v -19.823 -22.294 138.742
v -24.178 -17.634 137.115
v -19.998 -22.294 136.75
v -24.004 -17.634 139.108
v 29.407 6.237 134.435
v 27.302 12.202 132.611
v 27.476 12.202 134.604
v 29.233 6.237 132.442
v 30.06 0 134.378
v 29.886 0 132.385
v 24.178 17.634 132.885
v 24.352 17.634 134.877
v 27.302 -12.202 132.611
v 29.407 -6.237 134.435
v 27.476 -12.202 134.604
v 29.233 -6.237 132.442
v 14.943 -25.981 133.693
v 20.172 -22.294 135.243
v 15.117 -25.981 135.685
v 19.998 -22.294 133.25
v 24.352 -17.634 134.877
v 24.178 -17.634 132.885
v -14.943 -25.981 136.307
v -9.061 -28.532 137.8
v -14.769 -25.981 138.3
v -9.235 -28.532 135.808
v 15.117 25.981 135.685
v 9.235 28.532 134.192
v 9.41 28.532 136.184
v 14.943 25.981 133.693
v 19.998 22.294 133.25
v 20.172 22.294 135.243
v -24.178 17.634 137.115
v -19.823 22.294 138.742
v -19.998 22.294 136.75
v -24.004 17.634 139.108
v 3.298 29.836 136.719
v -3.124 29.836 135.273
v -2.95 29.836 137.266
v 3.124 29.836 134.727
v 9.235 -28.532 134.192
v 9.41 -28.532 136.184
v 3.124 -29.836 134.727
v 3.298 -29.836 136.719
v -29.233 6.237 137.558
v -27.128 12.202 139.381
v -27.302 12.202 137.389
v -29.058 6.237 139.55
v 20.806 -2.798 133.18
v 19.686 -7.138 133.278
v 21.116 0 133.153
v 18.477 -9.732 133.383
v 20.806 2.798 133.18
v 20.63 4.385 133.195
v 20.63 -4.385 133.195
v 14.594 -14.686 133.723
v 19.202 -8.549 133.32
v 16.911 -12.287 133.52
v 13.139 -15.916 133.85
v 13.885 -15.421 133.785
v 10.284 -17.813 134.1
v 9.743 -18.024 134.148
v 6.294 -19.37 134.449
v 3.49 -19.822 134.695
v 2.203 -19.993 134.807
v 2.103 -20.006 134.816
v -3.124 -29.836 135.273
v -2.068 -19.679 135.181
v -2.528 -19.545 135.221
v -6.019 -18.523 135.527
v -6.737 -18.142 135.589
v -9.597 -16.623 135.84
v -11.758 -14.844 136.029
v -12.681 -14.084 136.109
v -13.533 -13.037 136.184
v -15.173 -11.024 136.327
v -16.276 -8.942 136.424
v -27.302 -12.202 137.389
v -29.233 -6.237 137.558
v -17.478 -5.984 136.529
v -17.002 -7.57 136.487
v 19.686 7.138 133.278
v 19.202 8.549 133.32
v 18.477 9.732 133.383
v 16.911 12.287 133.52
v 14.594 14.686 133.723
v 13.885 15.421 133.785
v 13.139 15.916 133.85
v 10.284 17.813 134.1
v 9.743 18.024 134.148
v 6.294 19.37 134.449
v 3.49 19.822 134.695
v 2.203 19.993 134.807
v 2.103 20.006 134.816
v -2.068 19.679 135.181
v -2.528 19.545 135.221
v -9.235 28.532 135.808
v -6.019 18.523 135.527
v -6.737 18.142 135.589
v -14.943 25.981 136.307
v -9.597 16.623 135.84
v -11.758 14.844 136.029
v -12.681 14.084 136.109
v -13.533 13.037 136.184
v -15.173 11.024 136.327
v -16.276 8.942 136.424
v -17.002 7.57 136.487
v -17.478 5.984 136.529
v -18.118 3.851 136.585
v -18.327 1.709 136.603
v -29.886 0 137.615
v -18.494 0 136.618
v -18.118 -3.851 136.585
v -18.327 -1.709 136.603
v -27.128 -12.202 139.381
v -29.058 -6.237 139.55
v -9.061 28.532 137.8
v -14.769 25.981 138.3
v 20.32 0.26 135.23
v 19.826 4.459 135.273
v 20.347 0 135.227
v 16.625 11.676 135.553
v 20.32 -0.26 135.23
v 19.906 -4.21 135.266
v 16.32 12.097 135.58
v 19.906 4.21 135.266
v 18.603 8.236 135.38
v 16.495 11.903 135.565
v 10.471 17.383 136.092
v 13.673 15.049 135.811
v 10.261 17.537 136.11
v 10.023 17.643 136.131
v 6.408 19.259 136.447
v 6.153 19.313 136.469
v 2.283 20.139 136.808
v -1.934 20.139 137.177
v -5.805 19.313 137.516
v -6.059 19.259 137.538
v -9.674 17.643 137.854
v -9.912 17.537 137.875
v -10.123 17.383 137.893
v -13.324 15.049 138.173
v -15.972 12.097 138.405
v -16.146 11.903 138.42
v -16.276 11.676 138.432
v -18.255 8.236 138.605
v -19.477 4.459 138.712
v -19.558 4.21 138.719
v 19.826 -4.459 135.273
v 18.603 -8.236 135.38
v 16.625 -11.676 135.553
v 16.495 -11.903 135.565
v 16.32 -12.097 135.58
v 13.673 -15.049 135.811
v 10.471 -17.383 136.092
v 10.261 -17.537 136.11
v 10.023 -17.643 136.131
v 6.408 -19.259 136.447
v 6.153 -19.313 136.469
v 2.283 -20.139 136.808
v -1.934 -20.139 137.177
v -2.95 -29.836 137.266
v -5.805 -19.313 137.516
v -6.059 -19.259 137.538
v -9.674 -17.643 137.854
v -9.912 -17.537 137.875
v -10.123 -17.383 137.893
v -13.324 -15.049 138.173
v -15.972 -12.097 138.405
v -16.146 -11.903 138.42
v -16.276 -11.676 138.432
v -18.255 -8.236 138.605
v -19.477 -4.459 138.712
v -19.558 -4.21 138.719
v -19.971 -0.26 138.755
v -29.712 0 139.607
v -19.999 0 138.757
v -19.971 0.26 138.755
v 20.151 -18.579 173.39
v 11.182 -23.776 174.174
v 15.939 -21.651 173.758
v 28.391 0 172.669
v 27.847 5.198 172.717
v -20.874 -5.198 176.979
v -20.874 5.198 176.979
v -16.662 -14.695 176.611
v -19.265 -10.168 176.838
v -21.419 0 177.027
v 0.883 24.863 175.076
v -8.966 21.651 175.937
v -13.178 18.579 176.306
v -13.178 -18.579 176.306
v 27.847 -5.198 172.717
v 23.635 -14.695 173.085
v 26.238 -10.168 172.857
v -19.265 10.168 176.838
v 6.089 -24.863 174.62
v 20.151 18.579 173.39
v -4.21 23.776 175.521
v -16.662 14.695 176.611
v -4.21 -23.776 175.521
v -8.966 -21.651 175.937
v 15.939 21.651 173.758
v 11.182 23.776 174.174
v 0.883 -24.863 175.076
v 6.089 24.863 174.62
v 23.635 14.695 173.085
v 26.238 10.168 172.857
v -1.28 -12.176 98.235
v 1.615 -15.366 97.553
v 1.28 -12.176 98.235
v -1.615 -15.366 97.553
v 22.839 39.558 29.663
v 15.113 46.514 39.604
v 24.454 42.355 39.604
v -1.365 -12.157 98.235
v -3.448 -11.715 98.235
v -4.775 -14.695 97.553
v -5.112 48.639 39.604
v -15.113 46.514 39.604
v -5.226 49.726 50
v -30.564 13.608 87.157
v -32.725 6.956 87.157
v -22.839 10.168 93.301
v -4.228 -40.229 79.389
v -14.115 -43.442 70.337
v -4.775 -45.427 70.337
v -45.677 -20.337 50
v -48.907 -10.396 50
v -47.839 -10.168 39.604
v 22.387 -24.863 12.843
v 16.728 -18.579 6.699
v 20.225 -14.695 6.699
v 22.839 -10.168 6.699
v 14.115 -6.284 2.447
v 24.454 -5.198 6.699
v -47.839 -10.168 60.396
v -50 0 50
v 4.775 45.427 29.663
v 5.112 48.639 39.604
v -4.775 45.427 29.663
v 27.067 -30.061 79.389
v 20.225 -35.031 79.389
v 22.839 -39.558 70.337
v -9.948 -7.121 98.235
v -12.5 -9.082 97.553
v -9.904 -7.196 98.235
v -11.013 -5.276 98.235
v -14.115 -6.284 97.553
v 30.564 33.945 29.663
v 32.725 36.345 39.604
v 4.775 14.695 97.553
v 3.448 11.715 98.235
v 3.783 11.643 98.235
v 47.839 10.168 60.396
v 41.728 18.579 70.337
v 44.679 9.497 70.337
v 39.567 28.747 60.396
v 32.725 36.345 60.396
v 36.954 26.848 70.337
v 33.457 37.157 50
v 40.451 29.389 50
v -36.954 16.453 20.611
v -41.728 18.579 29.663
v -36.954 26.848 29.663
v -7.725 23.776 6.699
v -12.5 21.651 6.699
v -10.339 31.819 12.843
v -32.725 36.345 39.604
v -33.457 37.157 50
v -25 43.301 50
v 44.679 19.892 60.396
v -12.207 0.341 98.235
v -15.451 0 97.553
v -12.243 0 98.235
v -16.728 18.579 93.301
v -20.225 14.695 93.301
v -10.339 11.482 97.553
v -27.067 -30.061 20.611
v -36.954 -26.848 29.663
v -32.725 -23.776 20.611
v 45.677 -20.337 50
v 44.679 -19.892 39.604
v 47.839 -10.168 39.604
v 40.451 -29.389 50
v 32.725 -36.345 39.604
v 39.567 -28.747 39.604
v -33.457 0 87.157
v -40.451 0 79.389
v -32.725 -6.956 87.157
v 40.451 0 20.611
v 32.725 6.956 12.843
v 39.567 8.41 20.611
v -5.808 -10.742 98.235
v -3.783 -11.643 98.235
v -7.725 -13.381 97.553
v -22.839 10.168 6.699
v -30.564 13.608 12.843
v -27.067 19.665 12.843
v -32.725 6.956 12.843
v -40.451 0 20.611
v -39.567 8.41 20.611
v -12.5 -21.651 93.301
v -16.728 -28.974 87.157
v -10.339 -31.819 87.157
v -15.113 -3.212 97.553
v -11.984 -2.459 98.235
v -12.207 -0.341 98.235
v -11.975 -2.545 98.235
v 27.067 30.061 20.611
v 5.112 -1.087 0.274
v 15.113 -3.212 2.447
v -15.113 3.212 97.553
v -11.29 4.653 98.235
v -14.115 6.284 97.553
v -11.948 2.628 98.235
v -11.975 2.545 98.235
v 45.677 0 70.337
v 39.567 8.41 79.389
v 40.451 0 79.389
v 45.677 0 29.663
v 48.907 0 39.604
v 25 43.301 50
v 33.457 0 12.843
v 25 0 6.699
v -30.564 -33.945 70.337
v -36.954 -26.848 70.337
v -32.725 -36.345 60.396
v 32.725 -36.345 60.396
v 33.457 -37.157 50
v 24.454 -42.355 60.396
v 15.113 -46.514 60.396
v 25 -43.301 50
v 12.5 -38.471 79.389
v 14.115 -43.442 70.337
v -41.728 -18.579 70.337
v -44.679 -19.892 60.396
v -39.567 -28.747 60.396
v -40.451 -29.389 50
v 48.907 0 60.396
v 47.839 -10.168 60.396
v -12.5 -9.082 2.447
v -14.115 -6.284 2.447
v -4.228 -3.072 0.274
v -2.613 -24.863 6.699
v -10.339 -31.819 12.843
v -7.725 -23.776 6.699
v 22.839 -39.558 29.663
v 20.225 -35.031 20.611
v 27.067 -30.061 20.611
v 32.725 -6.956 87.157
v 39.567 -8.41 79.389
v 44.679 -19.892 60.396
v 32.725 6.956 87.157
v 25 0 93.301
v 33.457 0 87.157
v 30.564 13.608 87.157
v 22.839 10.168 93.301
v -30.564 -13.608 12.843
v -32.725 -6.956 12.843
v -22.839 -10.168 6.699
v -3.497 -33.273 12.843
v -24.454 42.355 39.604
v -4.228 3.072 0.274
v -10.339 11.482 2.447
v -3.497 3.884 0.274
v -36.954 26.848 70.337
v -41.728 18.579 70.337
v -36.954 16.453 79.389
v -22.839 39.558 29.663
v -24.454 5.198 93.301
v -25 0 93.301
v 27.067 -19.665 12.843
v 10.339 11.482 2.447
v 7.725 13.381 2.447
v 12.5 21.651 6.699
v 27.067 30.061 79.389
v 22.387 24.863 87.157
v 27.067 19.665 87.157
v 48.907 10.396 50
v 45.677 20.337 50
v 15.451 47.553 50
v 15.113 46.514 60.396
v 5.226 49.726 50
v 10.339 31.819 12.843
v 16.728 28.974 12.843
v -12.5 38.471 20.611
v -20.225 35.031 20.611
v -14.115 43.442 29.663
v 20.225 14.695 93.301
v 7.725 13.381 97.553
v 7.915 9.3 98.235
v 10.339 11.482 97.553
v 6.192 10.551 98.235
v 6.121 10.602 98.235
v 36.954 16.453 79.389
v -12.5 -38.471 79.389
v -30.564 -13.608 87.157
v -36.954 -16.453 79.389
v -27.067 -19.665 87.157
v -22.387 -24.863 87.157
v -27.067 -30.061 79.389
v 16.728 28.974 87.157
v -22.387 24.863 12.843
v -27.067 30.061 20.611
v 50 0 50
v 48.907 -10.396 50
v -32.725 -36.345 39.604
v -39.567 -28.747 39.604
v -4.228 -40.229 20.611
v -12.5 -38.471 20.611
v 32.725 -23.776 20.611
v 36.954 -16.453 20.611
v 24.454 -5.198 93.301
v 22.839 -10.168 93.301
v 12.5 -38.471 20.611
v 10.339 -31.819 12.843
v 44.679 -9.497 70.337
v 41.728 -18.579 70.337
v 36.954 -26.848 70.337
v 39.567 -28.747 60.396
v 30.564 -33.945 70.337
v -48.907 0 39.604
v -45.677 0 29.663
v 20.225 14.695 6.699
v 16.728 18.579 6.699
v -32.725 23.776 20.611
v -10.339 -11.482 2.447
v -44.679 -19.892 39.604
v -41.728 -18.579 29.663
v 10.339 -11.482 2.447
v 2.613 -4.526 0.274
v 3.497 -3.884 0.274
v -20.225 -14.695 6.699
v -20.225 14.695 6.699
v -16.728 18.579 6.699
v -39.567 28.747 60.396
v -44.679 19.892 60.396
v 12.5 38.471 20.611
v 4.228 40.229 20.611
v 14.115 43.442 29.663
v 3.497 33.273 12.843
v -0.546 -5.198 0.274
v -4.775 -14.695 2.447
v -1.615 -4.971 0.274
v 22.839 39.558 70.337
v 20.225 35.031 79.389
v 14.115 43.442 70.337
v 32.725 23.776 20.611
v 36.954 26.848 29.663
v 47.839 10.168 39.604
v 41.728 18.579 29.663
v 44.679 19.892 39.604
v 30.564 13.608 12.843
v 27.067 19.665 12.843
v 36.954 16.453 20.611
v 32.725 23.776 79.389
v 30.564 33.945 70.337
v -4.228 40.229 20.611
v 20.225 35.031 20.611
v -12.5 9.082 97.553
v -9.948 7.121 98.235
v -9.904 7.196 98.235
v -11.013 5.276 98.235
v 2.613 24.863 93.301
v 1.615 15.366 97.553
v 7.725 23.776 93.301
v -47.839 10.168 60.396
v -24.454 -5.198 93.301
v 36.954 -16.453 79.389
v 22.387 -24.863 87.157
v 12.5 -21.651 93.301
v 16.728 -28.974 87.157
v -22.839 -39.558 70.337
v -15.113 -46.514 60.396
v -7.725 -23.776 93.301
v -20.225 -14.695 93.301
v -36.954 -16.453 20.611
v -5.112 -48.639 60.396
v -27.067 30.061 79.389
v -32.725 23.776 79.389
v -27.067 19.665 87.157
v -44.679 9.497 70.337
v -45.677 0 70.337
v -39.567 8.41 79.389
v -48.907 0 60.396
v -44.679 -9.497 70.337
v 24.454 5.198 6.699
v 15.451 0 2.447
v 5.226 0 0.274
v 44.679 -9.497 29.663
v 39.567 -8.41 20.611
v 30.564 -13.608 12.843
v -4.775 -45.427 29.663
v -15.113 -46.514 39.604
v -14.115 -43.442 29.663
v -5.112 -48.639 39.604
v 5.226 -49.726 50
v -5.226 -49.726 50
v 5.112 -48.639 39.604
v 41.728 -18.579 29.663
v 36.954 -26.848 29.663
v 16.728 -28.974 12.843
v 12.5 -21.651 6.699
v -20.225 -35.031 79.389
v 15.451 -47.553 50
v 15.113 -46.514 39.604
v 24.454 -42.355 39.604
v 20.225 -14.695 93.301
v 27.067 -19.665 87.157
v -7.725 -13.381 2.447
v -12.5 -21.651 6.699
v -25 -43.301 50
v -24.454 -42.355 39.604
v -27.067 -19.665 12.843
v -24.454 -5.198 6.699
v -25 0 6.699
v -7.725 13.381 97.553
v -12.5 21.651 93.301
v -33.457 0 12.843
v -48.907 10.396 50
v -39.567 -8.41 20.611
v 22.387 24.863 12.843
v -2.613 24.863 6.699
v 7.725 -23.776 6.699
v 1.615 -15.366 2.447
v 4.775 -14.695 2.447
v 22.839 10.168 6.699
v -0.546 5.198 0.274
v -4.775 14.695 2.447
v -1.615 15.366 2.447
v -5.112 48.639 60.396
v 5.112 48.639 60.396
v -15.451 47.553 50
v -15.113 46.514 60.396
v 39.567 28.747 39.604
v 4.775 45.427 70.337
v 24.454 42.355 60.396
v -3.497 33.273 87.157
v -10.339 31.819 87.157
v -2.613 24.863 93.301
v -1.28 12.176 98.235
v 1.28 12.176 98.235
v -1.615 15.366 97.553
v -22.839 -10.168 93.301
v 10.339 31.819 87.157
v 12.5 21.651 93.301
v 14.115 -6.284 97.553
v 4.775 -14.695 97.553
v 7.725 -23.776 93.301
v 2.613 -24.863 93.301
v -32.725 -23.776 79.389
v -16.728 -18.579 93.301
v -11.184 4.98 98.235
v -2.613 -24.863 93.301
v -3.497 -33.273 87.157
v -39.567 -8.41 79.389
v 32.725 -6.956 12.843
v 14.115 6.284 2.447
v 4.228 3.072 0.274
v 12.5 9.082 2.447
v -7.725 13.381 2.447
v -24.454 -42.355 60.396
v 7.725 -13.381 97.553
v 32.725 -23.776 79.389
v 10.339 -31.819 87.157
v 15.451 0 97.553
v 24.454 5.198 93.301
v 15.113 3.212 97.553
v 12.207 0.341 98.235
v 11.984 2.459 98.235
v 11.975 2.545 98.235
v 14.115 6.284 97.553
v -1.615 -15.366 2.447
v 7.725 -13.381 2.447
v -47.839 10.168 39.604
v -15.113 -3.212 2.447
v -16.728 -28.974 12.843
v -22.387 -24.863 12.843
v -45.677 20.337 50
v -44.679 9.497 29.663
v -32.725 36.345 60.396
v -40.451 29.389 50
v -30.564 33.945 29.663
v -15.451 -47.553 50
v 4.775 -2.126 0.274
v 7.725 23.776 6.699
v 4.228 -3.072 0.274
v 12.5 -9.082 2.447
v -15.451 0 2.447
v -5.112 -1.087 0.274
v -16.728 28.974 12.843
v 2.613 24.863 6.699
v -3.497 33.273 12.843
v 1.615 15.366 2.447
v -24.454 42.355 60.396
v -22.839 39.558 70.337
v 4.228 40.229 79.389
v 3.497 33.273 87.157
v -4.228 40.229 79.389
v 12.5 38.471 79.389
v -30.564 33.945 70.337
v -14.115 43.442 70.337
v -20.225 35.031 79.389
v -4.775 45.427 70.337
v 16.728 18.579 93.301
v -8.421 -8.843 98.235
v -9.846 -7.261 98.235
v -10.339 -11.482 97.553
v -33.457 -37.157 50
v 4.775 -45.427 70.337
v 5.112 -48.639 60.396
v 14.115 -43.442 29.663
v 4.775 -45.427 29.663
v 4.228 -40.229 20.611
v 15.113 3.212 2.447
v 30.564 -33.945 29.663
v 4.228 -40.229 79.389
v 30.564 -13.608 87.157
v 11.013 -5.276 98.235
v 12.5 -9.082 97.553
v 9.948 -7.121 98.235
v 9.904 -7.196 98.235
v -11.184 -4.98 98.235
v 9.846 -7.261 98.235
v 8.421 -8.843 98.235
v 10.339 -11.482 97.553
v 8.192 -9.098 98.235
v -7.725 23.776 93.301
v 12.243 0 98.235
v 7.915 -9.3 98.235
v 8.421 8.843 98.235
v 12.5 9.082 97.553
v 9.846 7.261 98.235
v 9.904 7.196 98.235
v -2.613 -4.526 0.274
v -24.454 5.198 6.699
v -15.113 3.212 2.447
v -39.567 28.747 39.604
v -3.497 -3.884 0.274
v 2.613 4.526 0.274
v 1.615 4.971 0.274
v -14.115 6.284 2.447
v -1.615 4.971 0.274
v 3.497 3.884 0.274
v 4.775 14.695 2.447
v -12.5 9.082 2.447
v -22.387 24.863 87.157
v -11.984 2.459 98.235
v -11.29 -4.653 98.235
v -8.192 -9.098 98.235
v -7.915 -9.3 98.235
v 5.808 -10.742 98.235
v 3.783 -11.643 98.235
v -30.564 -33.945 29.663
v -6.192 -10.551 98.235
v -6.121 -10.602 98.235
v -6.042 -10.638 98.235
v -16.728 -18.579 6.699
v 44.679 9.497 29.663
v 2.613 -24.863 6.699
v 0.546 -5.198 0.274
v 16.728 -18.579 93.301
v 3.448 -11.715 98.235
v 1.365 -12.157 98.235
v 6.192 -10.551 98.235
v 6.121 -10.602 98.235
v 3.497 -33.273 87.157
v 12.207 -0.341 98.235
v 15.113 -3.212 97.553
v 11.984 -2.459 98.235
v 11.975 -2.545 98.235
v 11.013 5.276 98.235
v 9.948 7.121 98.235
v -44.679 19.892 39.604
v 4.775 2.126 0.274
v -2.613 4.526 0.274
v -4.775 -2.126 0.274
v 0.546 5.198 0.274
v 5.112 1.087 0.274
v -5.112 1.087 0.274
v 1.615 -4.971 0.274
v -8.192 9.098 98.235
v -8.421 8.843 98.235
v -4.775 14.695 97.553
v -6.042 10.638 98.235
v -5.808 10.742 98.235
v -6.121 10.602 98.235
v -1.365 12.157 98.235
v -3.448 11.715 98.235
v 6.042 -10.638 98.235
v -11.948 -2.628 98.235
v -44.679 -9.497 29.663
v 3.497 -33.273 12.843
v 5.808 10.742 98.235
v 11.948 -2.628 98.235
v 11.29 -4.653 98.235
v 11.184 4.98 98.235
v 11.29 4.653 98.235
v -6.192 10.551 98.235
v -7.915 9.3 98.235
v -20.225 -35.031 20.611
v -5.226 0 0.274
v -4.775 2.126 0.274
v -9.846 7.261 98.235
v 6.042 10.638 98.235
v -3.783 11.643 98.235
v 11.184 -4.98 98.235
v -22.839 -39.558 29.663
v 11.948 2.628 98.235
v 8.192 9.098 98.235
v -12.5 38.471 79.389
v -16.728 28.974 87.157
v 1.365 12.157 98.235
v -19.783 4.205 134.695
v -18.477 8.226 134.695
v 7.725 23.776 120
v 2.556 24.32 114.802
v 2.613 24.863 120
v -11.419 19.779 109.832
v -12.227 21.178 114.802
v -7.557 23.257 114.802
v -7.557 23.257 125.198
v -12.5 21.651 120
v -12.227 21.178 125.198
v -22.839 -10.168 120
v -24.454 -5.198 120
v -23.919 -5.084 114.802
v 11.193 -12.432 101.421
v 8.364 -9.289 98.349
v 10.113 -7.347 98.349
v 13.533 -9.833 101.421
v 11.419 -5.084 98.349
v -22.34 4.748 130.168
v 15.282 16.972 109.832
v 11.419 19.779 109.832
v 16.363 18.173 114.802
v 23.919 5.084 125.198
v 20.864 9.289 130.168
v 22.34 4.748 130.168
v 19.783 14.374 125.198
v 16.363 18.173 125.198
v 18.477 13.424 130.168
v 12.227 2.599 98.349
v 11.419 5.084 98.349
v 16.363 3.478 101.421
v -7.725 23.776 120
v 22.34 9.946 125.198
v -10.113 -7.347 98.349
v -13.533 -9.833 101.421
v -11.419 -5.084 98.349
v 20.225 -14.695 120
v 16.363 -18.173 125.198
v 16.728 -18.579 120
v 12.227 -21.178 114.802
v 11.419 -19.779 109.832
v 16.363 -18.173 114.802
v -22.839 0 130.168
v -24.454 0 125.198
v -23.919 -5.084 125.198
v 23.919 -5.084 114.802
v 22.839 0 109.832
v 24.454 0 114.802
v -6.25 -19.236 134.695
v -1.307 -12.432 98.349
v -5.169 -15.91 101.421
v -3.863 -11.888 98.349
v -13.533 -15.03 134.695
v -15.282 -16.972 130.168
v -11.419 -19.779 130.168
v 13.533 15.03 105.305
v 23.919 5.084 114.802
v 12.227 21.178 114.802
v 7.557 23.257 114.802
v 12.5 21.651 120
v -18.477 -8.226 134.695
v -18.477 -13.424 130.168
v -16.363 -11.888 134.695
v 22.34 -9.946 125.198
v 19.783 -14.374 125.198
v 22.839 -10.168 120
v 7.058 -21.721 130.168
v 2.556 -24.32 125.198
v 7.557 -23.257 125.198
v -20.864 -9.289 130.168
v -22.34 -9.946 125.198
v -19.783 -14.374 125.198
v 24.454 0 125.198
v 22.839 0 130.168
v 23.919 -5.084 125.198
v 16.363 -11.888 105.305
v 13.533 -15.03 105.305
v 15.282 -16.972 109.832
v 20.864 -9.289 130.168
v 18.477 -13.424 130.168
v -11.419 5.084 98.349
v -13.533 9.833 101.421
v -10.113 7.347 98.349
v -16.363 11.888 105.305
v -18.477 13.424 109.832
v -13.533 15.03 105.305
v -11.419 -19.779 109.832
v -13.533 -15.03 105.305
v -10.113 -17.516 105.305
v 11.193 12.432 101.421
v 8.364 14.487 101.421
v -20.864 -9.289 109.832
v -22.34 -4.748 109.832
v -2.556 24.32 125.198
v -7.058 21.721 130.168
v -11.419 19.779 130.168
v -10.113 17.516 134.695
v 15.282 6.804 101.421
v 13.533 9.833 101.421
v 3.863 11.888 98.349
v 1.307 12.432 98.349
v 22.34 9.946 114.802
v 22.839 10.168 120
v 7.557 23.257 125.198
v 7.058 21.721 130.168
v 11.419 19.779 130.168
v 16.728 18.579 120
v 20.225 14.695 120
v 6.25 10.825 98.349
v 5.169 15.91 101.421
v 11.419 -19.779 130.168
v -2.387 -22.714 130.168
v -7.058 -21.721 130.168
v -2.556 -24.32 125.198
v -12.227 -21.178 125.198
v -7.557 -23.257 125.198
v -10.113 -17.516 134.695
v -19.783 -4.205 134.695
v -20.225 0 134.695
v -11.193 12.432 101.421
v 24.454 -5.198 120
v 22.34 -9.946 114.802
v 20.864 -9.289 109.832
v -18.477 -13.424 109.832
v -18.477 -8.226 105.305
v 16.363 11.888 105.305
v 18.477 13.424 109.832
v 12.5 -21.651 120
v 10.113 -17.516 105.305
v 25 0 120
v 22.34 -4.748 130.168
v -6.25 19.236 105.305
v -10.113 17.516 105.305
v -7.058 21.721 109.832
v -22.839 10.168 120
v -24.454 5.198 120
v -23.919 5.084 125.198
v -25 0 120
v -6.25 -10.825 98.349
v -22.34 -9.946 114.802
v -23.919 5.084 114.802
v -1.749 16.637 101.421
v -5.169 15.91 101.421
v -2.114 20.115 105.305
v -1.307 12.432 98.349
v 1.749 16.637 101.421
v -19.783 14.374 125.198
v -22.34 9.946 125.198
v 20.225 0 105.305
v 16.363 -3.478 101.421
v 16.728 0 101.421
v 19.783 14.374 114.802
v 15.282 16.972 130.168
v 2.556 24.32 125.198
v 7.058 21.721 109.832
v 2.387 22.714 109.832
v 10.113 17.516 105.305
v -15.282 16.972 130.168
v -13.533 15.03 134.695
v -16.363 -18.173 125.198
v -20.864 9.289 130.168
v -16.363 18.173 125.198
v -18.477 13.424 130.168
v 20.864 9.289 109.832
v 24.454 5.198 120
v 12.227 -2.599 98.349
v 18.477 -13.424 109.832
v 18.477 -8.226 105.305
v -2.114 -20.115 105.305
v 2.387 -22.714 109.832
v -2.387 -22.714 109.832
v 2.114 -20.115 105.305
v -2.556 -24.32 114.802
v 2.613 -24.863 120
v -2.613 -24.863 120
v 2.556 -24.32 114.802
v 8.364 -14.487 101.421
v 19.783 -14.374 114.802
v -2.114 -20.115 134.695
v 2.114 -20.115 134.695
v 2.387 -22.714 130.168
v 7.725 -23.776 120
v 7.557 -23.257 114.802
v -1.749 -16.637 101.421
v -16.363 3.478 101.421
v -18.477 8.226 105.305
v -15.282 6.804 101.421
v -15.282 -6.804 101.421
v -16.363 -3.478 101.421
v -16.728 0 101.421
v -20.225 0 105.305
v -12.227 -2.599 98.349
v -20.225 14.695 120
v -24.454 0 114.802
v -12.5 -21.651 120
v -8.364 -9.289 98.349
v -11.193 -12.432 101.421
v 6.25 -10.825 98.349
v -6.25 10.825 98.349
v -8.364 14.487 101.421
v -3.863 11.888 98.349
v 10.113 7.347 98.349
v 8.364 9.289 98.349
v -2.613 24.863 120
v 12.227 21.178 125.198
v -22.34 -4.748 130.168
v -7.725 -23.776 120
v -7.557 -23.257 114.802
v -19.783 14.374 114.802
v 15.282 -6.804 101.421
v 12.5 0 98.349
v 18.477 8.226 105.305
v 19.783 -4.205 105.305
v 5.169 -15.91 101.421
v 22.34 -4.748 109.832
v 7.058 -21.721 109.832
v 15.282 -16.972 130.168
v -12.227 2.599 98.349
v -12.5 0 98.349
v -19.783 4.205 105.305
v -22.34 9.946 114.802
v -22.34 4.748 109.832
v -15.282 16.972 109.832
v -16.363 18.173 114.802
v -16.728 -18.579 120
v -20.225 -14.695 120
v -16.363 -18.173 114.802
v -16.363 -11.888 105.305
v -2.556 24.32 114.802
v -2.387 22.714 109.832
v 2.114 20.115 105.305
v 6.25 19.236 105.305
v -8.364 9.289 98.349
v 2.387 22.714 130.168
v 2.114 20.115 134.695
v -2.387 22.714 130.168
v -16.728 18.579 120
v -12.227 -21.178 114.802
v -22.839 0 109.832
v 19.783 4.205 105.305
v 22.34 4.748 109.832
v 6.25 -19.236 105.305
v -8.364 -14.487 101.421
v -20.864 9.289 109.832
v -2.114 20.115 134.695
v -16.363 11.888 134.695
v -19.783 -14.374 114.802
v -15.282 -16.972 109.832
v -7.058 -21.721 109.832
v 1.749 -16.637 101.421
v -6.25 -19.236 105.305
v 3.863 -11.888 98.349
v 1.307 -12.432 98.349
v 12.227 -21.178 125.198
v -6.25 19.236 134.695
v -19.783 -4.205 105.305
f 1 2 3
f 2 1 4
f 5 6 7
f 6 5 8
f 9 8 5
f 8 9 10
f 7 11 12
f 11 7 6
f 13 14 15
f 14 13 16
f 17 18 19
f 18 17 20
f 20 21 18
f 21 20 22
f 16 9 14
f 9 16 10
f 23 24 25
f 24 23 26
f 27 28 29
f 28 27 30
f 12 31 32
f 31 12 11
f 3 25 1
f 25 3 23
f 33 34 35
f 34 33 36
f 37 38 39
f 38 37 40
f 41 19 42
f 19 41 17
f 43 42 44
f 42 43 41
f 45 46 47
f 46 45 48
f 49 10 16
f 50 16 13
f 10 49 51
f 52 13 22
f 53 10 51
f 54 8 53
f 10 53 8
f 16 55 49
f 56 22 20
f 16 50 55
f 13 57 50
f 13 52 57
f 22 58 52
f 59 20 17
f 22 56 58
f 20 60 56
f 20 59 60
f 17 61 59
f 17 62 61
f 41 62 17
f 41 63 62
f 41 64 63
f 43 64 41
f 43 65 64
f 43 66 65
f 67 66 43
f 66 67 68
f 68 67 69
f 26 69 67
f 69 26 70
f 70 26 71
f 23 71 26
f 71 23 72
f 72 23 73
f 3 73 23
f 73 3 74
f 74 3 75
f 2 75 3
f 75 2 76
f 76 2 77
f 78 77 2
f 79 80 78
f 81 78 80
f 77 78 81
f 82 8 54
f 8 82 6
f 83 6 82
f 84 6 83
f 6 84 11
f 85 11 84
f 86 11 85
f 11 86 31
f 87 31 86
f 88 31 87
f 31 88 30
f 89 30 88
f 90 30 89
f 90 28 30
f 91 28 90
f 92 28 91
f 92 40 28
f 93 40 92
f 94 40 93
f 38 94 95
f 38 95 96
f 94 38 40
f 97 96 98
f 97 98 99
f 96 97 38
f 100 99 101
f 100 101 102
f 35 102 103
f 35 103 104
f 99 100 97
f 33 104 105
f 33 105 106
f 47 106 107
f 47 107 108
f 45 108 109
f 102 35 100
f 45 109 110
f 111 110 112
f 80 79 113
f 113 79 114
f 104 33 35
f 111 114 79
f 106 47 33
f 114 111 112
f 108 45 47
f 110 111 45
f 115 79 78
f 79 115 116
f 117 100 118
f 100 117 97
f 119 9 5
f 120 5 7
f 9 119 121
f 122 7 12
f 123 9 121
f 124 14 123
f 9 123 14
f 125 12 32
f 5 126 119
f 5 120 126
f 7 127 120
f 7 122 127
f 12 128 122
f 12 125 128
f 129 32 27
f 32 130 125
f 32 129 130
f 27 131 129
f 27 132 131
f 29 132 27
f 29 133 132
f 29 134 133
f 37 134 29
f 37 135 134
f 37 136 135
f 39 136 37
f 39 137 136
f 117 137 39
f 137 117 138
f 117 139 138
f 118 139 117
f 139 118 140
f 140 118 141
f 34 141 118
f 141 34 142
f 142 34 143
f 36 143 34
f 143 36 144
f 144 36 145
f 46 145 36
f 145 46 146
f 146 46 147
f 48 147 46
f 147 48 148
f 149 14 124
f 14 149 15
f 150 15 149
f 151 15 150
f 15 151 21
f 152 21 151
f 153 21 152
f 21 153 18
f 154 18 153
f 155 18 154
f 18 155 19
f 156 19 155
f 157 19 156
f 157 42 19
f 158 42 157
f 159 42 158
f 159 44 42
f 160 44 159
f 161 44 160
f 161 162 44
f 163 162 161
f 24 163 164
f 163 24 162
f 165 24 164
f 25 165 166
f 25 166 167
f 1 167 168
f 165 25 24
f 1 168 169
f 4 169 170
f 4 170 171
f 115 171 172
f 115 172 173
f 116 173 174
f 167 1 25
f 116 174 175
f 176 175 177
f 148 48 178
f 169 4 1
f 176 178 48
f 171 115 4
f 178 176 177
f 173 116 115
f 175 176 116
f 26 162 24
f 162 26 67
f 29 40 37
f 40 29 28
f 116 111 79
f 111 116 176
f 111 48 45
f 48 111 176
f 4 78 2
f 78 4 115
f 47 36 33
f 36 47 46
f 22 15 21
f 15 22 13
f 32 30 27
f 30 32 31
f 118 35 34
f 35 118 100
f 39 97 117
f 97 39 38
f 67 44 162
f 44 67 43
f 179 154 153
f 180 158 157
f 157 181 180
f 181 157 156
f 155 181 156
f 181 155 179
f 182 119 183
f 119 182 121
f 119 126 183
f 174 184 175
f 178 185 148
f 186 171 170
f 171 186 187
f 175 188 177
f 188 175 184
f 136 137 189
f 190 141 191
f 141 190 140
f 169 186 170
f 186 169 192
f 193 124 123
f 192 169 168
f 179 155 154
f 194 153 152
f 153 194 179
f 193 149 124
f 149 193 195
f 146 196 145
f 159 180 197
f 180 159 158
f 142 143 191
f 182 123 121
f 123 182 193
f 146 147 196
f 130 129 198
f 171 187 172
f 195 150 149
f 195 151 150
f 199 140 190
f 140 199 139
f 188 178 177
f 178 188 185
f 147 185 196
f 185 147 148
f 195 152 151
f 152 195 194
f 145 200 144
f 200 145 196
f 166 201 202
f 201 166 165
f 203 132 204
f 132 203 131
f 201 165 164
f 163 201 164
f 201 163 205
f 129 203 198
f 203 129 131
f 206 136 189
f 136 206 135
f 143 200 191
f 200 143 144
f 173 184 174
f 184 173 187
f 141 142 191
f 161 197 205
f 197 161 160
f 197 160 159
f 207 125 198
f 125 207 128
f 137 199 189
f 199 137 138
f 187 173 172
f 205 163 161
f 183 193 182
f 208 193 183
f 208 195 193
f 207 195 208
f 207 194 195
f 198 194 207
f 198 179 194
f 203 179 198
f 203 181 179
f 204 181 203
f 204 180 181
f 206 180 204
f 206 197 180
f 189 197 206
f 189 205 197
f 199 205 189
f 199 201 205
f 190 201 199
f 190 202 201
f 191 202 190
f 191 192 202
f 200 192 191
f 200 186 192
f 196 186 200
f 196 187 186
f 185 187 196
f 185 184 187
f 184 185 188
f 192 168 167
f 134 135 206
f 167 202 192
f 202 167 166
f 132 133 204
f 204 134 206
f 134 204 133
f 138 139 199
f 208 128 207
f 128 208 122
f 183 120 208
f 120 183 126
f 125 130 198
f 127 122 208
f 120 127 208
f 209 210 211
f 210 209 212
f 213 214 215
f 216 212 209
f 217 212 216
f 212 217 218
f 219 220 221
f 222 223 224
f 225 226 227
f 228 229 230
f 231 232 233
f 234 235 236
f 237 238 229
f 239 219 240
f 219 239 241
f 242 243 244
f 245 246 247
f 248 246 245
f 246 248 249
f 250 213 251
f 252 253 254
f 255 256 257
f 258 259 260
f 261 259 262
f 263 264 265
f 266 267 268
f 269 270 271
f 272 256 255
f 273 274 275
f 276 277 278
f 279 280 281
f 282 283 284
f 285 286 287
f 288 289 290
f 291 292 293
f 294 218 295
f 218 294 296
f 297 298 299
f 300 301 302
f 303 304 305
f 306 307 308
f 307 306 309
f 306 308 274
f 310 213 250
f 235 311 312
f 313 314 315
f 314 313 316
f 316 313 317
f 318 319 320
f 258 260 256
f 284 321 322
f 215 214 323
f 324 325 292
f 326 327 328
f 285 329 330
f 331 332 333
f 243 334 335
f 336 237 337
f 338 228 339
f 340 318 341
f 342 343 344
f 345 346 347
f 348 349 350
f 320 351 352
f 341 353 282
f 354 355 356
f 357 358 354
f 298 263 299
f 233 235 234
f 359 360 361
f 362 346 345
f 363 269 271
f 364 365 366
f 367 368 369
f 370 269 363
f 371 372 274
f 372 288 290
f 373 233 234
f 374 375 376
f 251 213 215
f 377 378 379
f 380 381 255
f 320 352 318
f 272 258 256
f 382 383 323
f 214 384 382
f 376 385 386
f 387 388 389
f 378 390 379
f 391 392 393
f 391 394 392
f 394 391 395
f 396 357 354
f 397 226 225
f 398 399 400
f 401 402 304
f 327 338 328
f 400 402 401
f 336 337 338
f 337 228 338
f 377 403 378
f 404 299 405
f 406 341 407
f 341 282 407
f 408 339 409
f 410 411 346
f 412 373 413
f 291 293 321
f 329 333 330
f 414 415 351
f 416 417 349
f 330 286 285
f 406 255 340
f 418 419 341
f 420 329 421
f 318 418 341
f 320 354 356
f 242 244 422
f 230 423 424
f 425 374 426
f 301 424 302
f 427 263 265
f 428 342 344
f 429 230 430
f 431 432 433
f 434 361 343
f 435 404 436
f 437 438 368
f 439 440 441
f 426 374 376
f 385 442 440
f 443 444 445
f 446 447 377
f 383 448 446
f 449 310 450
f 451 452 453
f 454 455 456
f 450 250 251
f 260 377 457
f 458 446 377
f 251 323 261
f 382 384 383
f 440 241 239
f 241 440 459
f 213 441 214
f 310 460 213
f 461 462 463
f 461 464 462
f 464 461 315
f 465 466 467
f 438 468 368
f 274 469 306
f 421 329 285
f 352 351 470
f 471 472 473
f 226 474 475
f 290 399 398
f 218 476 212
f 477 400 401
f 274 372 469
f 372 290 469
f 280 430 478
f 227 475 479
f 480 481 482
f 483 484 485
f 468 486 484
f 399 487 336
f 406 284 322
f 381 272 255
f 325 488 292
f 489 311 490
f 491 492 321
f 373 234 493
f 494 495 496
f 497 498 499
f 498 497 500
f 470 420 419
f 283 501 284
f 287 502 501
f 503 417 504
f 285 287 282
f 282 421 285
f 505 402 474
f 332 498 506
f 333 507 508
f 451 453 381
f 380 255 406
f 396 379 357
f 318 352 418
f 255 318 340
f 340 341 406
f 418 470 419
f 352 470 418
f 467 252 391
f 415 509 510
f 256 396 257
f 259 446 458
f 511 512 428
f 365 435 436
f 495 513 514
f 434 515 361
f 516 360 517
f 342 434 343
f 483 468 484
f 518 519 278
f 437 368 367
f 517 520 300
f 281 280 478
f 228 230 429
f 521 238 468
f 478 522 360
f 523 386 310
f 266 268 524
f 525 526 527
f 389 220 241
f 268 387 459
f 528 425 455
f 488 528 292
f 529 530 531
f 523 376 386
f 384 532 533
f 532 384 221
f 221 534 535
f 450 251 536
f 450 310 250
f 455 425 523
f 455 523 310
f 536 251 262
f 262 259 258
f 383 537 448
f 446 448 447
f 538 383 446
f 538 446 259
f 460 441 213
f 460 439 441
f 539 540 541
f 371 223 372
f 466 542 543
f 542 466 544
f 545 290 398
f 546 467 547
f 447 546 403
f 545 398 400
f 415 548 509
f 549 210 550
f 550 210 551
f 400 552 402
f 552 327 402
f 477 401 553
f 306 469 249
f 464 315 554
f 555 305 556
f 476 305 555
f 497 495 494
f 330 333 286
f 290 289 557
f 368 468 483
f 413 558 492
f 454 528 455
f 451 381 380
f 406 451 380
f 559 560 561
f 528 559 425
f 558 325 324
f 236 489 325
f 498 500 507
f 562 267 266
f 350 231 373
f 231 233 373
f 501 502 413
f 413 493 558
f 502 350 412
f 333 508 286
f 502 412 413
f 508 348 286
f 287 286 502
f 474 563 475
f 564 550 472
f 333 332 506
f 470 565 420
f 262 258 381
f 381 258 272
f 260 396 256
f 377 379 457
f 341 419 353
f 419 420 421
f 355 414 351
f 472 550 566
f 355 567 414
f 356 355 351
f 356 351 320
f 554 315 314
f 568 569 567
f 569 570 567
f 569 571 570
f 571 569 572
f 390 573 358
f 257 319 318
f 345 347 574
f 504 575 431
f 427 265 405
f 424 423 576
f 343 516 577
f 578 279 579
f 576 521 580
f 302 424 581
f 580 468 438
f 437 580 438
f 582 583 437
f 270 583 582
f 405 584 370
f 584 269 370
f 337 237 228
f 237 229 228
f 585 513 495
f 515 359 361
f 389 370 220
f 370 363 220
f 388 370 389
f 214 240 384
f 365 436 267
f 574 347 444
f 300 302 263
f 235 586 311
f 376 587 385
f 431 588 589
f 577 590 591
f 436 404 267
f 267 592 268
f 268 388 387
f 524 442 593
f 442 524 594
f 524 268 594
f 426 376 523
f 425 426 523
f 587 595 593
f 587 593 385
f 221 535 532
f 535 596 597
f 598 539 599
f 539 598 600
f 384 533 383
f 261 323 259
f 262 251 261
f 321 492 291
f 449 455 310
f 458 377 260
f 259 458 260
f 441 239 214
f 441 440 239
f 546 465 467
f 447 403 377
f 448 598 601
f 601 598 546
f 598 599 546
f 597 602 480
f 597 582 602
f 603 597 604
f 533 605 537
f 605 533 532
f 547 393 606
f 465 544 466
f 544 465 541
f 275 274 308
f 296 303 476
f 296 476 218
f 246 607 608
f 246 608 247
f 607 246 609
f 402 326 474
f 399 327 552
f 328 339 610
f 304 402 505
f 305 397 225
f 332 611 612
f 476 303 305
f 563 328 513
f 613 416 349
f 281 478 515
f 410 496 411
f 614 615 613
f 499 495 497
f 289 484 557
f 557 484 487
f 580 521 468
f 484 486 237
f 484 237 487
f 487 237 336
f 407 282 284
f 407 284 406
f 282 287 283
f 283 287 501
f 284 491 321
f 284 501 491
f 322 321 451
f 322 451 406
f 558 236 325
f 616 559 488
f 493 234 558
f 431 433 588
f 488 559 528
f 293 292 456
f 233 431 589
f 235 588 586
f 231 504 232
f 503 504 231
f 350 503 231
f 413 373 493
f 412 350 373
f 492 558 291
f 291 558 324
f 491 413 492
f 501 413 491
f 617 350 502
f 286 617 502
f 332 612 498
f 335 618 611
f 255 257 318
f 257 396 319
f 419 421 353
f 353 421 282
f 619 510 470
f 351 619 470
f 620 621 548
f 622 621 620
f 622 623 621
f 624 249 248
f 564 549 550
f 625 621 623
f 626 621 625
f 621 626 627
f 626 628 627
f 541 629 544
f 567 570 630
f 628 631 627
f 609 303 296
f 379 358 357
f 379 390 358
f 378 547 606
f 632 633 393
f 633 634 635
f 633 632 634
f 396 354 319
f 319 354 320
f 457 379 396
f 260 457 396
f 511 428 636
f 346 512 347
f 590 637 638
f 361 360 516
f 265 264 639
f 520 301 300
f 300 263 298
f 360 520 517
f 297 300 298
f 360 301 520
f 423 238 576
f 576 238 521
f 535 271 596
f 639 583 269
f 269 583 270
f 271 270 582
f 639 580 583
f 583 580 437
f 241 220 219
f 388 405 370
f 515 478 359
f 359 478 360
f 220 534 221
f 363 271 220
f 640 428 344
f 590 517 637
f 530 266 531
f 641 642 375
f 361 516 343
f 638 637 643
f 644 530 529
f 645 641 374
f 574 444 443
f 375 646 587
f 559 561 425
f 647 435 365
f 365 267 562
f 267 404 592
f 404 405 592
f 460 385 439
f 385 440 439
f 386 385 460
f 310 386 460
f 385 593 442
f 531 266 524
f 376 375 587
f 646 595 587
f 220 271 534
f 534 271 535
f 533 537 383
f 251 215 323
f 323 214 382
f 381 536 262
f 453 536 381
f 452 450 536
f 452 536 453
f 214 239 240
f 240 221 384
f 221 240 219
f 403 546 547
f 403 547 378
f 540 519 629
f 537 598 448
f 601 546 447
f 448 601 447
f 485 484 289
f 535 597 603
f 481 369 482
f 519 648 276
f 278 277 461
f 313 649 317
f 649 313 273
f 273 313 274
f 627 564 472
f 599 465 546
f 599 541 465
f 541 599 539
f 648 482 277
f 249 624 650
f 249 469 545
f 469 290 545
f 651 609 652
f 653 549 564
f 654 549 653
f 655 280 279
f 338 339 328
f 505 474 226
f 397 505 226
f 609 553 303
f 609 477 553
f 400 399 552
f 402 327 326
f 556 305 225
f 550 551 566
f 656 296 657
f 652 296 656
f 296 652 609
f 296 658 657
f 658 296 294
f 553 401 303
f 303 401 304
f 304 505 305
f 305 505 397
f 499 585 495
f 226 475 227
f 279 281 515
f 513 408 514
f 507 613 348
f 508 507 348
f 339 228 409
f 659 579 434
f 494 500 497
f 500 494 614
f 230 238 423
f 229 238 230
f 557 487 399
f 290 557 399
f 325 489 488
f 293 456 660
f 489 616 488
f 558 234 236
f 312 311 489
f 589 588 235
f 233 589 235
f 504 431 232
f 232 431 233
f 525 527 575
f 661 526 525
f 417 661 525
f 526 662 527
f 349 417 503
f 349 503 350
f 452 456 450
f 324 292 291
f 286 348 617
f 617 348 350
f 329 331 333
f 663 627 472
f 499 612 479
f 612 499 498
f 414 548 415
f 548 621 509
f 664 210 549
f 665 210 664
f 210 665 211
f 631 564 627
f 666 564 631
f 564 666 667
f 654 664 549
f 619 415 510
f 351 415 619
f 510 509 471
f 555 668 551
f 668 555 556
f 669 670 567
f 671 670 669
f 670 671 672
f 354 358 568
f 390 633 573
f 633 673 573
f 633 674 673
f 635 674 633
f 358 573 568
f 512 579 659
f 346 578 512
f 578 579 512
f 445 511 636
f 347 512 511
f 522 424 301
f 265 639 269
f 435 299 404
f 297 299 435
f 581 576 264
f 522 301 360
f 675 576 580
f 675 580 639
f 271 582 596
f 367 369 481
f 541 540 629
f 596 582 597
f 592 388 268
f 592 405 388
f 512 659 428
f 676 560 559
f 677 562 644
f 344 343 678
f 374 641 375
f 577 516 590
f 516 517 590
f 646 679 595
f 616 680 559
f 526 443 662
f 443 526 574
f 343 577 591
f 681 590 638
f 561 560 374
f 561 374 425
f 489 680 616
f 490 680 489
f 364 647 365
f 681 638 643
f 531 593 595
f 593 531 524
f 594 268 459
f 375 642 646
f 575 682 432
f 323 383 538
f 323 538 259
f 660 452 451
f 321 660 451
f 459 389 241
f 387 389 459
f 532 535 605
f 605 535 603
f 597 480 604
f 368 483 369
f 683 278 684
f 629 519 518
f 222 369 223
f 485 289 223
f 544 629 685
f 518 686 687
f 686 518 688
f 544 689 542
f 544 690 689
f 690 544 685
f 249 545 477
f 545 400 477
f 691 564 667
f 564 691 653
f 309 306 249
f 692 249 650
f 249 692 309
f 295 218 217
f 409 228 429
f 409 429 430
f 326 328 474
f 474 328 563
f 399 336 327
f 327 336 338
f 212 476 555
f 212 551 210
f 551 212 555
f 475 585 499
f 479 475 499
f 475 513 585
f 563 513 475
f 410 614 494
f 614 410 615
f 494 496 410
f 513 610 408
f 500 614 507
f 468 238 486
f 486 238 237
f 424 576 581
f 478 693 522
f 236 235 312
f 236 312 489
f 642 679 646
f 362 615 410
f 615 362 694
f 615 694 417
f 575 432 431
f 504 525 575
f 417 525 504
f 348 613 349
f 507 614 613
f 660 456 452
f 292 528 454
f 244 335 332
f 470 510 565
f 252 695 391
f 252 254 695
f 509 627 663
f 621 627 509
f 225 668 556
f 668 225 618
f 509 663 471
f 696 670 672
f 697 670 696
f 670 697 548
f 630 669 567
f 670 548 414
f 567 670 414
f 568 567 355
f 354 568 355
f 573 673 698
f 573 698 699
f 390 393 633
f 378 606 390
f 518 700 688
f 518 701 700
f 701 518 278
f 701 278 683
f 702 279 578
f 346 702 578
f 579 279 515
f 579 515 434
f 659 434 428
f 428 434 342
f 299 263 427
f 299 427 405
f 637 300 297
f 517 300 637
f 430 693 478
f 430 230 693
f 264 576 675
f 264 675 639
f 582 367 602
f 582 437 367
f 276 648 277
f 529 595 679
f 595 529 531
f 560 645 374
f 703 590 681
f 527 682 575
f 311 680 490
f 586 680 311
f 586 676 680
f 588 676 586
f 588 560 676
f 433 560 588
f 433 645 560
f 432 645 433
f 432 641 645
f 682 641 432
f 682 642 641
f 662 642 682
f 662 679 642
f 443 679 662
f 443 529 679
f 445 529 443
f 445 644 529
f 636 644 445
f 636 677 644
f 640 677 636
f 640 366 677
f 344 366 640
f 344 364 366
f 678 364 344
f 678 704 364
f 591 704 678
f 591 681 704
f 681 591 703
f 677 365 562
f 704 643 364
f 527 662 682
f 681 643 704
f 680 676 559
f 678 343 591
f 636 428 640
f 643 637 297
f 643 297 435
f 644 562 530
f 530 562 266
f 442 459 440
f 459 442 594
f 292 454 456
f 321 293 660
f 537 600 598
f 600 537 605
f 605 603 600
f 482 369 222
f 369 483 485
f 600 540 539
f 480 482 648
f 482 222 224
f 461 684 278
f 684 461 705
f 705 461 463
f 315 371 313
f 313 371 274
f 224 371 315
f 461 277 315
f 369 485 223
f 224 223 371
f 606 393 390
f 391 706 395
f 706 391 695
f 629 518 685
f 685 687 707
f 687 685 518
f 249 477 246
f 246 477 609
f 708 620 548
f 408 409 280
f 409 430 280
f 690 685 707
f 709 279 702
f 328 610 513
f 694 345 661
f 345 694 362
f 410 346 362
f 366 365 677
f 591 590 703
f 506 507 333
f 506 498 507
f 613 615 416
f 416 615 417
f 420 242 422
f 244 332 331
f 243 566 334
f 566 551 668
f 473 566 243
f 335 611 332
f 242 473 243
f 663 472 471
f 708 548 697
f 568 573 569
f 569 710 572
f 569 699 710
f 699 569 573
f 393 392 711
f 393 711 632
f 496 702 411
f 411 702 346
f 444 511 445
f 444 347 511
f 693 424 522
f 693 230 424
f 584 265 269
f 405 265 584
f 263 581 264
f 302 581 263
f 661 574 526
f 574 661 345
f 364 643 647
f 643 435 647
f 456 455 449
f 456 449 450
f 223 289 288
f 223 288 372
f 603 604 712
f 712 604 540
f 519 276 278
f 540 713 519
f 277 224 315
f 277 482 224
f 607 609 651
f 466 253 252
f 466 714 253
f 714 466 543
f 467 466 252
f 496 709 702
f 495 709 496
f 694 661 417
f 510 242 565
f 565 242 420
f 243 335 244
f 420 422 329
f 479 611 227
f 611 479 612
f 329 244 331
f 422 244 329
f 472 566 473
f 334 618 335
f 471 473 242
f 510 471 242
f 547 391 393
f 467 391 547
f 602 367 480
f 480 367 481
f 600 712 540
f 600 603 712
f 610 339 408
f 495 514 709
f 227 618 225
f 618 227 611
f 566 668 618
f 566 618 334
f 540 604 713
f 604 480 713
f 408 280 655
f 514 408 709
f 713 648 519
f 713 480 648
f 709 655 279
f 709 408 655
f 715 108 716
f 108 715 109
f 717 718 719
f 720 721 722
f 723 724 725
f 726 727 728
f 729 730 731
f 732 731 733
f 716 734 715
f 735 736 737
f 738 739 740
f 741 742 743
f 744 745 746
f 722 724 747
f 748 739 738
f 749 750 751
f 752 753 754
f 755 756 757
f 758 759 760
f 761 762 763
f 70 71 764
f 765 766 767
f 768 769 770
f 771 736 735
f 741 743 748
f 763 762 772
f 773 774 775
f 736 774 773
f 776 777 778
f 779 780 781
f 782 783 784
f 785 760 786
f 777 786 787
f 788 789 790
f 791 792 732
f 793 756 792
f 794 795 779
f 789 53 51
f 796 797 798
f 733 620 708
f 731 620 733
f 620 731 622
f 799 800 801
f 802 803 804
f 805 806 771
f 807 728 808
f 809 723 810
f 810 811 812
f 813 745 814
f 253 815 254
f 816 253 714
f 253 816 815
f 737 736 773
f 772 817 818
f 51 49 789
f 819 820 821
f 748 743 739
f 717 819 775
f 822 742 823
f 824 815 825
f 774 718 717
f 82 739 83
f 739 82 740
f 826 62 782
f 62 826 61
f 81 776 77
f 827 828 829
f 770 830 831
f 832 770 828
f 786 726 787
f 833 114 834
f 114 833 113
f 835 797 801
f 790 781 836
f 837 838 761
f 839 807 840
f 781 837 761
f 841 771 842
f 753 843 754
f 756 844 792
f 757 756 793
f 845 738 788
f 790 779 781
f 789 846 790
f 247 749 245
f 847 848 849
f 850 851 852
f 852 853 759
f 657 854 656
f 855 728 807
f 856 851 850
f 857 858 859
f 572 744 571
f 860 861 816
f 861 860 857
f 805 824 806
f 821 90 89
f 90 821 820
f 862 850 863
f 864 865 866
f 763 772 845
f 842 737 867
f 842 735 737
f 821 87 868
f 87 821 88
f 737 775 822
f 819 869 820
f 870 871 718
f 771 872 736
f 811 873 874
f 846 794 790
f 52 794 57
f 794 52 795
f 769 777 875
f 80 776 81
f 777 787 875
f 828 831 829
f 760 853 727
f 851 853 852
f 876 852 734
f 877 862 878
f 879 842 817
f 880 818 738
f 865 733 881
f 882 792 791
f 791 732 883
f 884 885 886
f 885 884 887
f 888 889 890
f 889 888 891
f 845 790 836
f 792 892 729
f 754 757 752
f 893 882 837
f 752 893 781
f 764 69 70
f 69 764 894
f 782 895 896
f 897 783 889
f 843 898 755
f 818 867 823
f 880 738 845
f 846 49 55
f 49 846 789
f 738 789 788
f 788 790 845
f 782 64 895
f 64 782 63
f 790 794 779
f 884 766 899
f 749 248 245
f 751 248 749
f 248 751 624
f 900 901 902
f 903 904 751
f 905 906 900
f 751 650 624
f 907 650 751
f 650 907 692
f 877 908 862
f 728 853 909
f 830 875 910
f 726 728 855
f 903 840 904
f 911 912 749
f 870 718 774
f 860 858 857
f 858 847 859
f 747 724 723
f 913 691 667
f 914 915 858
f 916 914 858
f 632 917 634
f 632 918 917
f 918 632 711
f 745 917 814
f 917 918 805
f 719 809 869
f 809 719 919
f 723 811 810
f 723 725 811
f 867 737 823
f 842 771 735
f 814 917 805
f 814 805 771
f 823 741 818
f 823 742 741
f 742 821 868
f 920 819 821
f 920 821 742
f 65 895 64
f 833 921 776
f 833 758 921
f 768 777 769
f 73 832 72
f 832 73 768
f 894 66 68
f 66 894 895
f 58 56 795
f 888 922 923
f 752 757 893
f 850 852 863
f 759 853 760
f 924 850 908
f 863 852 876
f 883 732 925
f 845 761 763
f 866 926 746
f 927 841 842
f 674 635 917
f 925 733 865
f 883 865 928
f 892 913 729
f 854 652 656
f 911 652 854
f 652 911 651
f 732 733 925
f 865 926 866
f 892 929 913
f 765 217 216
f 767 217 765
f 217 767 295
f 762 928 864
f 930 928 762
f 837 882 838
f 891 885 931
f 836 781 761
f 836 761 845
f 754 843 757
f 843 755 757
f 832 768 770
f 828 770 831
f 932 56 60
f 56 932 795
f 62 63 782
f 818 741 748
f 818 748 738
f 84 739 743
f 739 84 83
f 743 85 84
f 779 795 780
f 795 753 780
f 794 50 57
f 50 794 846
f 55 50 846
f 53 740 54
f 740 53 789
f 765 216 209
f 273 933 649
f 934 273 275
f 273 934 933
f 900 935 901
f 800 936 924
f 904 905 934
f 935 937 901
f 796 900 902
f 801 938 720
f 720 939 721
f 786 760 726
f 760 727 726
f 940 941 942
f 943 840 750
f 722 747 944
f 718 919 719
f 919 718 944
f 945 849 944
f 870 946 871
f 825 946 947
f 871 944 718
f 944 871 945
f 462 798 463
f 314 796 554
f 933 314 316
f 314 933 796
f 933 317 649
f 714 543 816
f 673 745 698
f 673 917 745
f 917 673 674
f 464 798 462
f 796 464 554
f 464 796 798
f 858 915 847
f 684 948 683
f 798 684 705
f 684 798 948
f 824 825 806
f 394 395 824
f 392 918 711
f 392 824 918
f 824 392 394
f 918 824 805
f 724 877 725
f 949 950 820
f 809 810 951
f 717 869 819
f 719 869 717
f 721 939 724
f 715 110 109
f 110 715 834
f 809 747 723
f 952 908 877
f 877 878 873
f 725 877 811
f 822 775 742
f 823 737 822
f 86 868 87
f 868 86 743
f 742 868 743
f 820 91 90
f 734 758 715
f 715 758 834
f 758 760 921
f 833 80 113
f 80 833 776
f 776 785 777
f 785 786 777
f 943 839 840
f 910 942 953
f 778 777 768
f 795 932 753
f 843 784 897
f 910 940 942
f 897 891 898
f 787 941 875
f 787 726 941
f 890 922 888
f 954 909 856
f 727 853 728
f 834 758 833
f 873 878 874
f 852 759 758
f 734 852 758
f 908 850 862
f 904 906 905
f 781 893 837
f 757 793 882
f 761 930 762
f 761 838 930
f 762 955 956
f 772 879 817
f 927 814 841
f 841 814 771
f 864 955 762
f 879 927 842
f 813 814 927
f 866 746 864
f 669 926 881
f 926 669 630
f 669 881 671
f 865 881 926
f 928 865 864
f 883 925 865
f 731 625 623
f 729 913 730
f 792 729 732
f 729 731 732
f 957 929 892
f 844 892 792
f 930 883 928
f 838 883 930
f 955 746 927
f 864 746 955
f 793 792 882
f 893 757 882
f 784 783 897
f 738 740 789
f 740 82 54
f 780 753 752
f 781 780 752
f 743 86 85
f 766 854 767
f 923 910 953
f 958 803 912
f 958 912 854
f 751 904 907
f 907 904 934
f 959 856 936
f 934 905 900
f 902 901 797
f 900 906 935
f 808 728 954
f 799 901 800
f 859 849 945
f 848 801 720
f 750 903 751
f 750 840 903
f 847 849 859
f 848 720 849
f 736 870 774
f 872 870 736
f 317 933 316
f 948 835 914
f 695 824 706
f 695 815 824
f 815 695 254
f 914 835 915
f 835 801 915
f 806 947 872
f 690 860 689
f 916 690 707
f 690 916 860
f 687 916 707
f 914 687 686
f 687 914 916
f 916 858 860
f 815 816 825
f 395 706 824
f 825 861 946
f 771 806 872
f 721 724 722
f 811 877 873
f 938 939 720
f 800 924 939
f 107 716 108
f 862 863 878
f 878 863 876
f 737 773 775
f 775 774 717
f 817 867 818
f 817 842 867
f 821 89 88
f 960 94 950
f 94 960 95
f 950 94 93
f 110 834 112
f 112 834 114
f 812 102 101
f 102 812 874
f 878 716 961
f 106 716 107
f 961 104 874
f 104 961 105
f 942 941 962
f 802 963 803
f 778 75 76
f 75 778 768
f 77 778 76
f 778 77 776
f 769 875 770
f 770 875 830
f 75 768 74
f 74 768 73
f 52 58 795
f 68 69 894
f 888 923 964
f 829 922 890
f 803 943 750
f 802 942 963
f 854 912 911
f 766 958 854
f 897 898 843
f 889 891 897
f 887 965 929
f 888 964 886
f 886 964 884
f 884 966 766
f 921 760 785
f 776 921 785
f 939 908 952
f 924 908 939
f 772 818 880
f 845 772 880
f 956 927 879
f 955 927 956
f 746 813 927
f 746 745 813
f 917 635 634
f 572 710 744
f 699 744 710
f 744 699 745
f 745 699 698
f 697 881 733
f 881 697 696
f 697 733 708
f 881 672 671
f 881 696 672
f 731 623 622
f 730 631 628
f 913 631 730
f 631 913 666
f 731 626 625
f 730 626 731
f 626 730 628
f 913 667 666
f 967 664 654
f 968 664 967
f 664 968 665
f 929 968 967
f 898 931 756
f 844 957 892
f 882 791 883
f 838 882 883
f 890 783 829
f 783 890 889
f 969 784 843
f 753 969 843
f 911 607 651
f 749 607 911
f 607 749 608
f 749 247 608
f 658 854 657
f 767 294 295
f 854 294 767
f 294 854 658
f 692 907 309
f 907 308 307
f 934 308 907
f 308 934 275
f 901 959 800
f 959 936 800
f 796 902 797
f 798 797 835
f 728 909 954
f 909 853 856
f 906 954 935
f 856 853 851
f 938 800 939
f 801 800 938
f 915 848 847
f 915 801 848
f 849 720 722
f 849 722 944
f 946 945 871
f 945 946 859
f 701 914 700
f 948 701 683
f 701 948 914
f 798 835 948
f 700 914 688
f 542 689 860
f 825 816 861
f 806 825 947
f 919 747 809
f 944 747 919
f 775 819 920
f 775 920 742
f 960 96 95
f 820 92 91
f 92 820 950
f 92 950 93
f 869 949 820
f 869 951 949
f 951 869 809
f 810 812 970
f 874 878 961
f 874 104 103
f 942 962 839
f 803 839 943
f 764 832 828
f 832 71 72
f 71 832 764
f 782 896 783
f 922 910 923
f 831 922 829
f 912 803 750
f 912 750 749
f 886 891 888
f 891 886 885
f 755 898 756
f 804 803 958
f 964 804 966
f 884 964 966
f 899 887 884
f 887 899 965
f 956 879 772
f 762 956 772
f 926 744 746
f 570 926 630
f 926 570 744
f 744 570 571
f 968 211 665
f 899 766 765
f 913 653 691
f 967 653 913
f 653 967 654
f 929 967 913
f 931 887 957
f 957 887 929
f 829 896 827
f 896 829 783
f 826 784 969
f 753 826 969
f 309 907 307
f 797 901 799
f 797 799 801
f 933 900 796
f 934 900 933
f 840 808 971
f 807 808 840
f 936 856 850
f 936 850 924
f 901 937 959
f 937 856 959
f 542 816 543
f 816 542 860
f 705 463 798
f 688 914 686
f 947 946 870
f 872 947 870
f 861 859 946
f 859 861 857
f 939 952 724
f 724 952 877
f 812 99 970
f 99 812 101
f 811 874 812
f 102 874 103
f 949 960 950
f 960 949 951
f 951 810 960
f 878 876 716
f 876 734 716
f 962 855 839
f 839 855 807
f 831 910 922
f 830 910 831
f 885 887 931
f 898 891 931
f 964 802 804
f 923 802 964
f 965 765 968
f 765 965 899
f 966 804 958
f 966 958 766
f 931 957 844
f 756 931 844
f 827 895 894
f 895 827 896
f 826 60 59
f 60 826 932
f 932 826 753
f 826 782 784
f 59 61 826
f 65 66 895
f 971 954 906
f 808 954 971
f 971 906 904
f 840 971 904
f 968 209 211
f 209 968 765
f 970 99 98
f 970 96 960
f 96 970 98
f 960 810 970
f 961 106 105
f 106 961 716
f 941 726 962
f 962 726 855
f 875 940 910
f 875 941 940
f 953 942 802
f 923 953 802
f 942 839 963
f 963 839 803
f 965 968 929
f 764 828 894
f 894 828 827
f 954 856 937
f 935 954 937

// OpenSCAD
 module snowman(jauntiness = 0) {
  translate([0,0,50]) sphere(r = 50);
  translate([0,0,120]) sphere(r = 25);
     
  translate([0,0,135]) {
    rotate([0, jauntiness, 0]) {
      cylinder(r = 30, h =  2);
      cylinder(r1 = 20, r2 = 25, h = 40);
    }
  }
 }
 
 snowman(jauntiness = 5);
